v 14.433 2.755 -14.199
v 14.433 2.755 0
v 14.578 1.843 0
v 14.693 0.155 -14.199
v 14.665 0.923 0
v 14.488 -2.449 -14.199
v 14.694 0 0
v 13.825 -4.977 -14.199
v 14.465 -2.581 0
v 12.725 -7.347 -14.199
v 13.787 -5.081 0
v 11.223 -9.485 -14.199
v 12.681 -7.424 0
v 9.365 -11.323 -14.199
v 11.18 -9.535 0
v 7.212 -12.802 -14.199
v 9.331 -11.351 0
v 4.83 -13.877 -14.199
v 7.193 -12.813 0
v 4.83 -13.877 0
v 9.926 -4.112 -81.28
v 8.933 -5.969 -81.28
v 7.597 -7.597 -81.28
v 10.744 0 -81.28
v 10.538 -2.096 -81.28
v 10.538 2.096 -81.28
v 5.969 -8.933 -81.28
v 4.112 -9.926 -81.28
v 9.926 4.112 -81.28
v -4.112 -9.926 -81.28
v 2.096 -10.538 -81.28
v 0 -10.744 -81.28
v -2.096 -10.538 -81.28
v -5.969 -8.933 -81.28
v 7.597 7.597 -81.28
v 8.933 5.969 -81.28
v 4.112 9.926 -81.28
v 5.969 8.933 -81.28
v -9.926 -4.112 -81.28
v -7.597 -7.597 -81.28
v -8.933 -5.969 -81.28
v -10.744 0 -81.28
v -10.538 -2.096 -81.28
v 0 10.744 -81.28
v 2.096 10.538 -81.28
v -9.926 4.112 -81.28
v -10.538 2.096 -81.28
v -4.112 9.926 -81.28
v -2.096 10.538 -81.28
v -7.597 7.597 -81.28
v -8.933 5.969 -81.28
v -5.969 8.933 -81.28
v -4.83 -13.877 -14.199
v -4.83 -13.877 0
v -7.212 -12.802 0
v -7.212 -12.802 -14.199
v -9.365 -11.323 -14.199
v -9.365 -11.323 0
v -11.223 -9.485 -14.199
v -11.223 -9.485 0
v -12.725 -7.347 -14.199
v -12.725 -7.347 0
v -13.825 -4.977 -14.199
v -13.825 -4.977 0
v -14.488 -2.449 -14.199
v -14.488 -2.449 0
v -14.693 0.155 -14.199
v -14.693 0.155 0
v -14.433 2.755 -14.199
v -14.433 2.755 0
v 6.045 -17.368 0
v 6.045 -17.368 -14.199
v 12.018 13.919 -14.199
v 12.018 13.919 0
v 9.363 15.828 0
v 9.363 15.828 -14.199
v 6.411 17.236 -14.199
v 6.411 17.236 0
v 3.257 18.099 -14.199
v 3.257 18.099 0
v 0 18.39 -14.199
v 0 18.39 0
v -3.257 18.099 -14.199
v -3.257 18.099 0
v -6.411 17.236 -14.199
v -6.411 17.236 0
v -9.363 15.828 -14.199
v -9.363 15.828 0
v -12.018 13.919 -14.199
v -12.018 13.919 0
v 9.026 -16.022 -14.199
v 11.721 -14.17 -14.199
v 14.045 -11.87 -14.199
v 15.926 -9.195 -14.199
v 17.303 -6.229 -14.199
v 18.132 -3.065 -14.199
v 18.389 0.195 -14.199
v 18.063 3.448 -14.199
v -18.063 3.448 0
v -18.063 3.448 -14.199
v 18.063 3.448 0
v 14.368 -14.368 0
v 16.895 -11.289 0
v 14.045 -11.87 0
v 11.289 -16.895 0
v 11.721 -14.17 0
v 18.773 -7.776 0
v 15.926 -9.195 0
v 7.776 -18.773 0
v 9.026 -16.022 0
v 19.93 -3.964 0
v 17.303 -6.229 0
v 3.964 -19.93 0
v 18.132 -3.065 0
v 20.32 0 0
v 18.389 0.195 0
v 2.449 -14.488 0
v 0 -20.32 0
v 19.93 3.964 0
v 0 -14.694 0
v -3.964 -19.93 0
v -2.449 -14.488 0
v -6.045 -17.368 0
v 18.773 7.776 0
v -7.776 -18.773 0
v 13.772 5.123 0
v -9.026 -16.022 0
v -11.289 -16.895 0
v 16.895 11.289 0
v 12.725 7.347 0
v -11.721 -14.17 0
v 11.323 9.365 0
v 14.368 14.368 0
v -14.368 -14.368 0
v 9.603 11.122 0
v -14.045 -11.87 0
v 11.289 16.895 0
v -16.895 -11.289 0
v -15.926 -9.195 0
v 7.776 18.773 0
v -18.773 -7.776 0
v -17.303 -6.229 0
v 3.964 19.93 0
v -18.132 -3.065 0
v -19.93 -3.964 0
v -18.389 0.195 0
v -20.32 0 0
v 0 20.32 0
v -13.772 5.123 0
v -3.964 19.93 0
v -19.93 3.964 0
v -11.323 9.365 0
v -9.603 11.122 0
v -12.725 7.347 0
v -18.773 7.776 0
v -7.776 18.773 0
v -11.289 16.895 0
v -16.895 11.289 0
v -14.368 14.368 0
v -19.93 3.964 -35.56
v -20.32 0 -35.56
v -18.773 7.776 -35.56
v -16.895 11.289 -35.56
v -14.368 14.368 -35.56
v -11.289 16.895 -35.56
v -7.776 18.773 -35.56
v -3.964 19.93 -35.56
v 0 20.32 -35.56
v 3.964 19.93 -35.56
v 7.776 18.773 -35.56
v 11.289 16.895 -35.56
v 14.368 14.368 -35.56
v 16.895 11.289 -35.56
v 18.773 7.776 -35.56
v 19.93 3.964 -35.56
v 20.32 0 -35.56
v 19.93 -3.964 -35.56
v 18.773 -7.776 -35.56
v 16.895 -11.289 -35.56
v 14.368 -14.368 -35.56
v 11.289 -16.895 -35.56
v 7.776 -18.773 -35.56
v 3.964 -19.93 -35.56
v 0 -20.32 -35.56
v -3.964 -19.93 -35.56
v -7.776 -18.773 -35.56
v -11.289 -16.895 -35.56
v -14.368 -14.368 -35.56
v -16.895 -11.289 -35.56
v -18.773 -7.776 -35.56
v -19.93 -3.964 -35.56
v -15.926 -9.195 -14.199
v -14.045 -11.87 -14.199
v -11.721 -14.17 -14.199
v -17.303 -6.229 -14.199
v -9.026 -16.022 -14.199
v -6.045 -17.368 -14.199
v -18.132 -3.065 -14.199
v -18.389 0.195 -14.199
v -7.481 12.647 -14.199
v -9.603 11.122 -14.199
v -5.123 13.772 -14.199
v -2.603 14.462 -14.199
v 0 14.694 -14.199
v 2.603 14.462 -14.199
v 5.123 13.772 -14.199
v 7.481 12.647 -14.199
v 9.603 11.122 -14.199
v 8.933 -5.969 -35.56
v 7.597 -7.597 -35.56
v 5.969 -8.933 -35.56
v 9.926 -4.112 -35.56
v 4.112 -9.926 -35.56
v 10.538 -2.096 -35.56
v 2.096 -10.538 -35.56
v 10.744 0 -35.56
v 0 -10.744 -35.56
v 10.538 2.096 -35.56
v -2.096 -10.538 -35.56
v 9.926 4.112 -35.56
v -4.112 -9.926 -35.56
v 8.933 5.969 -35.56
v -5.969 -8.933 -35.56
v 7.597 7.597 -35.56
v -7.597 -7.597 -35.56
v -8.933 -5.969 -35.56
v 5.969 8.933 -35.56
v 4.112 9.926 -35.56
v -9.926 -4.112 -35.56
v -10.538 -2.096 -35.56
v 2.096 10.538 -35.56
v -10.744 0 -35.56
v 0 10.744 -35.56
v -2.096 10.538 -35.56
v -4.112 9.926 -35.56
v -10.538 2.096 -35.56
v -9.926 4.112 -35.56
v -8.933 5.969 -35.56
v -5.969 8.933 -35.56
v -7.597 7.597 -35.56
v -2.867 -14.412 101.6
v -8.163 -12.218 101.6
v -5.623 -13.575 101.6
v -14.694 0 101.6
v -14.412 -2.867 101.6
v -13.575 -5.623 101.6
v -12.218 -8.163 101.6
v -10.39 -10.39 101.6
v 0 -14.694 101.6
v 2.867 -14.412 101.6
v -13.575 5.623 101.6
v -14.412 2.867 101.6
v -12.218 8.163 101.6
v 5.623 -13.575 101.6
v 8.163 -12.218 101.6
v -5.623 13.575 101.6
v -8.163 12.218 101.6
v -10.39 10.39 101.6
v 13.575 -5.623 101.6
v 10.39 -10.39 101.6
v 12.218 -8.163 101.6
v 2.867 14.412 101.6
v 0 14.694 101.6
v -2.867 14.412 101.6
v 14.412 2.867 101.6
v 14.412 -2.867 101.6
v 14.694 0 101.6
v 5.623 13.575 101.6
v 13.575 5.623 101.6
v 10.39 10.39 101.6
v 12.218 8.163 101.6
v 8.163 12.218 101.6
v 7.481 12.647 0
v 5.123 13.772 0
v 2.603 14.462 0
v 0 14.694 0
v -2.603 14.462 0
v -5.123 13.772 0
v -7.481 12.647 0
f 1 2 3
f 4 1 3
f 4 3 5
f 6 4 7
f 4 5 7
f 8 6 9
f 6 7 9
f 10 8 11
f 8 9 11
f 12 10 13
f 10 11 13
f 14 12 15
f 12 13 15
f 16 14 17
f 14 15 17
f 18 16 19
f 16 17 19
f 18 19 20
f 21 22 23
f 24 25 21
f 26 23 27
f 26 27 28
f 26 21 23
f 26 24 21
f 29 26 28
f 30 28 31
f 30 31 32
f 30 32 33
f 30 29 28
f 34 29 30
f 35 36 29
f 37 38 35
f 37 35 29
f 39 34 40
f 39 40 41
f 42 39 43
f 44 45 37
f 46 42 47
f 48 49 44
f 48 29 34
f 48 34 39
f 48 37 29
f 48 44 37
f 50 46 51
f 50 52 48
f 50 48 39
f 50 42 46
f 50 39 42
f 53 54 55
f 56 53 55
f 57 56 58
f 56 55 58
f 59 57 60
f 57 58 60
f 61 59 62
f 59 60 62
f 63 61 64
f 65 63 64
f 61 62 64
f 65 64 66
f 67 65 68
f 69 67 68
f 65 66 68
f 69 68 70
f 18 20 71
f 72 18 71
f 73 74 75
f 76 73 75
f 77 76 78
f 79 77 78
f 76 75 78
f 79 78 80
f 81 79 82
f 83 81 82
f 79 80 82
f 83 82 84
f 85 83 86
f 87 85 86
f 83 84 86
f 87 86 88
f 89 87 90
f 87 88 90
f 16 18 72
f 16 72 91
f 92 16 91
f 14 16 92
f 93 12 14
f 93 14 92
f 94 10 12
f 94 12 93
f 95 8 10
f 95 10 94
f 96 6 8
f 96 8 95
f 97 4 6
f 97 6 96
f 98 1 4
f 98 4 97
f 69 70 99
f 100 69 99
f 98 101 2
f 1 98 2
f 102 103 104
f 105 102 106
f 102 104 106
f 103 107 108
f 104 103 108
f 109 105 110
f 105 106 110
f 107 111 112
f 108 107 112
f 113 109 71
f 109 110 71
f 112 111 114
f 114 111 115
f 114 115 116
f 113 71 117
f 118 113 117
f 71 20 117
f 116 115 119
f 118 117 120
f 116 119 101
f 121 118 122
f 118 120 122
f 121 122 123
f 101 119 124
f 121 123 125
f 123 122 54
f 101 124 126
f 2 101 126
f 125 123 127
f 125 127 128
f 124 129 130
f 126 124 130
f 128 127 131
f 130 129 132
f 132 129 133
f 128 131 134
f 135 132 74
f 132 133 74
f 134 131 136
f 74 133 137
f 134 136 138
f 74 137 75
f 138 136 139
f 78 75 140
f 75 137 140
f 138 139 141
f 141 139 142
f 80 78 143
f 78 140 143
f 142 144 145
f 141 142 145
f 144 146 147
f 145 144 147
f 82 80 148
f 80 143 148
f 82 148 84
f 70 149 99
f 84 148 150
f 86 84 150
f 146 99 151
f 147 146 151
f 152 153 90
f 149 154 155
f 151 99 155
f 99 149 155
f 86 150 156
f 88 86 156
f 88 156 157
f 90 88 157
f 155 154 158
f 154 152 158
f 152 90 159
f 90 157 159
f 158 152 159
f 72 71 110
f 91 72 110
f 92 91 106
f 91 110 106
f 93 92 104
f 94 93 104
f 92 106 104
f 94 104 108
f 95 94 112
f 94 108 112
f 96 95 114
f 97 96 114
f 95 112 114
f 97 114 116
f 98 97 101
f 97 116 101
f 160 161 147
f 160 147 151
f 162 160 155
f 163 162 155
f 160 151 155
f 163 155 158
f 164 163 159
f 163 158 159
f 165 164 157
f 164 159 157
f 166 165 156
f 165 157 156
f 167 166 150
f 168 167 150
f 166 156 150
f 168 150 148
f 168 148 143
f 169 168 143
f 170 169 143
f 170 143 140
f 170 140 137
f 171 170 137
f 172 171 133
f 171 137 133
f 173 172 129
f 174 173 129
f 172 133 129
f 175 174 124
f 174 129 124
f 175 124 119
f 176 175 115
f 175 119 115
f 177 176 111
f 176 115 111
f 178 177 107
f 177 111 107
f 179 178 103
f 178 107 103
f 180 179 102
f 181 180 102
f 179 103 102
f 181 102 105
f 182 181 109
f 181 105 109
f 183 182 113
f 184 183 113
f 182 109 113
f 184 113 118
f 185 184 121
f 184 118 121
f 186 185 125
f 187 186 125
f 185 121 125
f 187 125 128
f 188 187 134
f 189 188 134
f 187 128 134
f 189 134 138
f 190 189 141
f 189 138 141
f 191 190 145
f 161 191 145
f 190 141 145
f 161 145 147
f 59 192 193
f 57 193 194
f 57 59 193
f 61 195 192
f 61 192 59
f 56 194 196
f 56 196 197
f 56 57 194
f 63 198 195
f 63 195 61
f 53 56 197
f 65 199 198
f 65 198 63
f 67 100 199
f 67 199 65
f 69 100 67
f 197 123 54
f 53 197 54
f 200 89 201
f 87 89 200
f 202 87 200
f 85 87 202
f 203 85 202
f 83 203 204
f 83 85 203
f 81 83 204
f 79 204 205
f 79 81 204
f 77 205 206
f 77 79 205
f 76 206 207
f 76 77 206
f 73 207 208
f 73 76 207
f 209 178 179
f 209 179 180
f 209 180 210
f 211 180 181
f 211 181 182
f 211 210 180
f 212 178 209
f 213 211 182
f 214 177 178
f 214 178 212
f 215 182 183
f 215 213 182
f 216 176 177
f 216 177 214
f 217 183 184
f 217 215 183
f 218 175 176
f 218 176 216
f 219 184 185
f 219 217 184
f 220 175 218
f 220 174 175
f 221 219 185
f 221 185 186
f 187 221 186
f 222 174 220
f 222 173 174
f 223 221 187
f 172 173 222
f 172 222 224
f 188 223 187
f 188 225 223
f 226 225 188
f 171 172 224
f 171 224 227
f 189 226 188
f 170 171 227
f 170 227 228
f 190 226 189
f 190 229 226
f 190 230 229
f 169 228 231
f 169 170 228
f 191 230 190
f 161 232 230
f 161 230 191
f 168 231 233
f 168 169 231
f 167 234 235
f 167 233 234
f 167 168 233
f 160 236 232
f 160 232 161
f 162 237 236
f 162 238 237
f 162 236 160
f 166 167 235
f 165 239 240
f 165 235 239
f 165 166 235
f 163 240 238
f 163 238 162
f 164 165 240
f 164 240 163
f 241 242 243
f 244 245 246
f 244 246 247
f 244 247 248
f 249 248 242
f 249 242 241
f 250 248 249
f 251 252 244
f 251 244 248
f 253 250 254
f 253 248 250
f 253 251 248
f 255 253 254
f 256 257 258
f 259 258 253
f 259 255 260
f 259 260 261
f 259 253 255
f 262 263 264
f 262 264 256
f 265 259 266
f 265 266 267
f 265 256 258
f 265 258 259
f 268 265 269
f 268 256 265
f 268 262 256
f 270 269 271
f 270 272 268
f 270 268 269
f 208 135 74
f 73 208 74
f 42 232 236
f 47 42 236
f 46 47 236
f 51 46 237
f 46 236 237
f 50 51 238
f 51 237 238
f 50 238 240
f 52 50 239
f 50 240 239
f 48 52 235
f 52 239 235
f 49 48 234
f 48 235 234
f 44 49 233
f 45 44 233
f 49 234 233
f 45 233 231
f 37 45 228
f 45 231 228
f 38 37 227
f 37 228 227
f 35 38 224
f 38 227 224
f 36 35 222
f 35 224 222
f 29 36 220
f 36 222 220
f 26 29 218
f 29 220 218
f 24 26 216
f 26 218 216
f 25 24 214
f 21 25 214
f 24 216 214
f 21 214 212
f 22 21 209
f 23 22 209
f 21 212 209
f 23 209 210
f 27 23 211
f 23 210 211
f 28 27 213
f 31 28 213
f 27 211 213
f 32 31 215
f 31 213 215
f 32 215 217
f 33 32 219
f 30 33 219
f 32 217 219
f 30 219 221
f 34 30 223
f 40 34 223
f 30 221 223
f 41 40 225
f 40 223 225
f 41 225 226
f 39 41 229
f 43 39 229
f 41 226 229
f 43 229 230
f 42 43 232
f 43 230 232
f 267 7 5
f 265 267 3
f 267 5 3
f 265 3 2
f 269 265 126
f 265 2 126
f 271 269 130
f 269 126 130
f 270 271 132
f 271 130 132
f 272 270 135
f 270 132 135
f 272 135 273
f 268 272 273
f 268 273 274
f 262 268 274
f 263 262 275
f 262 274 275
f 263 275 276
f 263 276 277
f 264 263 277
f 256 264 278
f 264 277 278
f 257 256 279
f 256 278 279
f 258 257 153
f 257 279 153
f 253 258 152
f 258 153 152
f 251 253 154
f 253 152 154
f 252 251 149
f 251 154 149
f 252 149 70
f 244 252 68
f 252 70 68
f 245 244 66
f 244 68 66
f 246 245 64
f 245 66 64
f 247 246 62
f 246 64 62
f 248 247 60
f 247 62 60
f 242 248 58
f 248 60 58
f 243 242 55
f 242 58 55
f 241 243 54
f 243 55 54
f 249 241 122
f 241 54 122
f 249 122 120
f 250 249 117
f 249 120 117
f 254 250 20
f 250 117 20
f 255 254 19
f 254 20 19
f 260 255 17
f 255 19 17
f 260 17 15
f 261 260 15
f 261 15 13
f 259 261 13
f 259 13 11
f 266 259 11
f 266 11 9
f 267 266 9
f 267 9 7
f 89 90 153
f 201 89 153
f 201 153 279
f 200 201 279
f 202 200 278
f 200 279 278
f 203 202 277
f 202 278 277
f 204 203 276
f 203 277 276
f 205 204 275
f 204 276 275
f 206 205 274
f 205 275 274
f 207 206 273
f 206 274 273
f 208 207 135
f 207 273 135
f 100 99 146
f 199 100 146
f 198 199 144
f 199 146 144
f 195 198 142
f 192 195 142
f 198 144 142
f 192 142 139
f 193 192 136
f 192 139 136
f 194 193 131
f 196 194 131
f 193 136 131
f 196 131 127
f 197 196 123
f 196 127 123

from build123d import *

# Parameters (mm, degrees)
SKETCH1_R           = 14.6939
BOSS_EXTRUDE1_DEPTH = 101.6
SKETCH2_R           = 20.32
BOSS_EXTRUDE2_DEPTH = 35.56
SKETCH3_R           = 10.7442
BOSS_EXTRUDE3_DEPTH = 45.72
CUT_EXTRUDE1_DEPTH  = 14.1986


with BuildPart() as part:
    # Sketch1 → Boss-Extrude1 (new body)
    with BuildSketch(Plane.XY):
        Circle(SKETCH1_R)
    extrude(amount=BOSS_EXTRUDE1_DEPTH)

    # Sketch2 → Boss-Extrude2 (add)
    with BuildSketch(Plane(origin=(0, 0, 0), x_dir=(-1, 0, 0), z_dir=(0, 0, -1))):
        Circle(SKETCH2_R)
    extrude(amount=BOSS_EXTRUDE2_DEPTH)

    # Sketch3 → Boss-Extrude3 (add)
    with BuildSketch(Plane(origin=(0, 0, -35.56), x_dir=(-1, 0, 0), z_dir=(0, 0, -1))):
        Circle(SKETCH3_R)
    extrude(amount=BOSS_EXTRUDE3_DEPTH)

    # Sketch5 → Cut-Extrude1 (cut)
    with BuildSketch(Plane.XY):
        with BuildLine():
            ThreePointArc((-9.602914805, 11.121813002), (0, 14.6939), (9.602914805, 11.121813002))
            Line((9.602914805, 11.121813002), (12.018168226, 13.919088355))
            ThreePointArc((12.018168226, 13.919088355), (0, 18.3896), (-12.018168226, 13.919088355))
            Line((-12.018168226, 13.919088355), (-9.602914805, 11.121813002))
        make_face()
        with BuildLine():
            ThreePointArc((14.433229999, 2.755461671), (12.725290681, -7.34695), (4.830315193, -13.877274673))
            Line((4.830315193, -13.877274673), (6.0452, -17.367583169))
            ThreePointArc((6.0452, -17.367583169), (15.925860765, -9.1948), (18.063368226, 3.448494813))
            Line((18.063368226, 3.448494813), (14.433229999, 2.755461671))
        make_face()
        with BuildLine():
            Line((-6.0452, -17.367583169), (-4.830315193, -13.877274673))
            ThreePointArc((-4.830315193, -13.877274673), (-12.725290681, -7.34695), (-14.433229999, 2.755461671))
            Line((-14.433229999, 2.755461671), (-18.063368226, 3.448494813))
            ThreePointArc((-18.063368226, 3.448494813), (-15.925860765, -9.1948), (-6.0452, -17.367583169))
        make_face()
    extrude(amount=-CUT_EXTRUDE1_DEPTH, mode=Mode.SUBTRACT)


solid = part.part
